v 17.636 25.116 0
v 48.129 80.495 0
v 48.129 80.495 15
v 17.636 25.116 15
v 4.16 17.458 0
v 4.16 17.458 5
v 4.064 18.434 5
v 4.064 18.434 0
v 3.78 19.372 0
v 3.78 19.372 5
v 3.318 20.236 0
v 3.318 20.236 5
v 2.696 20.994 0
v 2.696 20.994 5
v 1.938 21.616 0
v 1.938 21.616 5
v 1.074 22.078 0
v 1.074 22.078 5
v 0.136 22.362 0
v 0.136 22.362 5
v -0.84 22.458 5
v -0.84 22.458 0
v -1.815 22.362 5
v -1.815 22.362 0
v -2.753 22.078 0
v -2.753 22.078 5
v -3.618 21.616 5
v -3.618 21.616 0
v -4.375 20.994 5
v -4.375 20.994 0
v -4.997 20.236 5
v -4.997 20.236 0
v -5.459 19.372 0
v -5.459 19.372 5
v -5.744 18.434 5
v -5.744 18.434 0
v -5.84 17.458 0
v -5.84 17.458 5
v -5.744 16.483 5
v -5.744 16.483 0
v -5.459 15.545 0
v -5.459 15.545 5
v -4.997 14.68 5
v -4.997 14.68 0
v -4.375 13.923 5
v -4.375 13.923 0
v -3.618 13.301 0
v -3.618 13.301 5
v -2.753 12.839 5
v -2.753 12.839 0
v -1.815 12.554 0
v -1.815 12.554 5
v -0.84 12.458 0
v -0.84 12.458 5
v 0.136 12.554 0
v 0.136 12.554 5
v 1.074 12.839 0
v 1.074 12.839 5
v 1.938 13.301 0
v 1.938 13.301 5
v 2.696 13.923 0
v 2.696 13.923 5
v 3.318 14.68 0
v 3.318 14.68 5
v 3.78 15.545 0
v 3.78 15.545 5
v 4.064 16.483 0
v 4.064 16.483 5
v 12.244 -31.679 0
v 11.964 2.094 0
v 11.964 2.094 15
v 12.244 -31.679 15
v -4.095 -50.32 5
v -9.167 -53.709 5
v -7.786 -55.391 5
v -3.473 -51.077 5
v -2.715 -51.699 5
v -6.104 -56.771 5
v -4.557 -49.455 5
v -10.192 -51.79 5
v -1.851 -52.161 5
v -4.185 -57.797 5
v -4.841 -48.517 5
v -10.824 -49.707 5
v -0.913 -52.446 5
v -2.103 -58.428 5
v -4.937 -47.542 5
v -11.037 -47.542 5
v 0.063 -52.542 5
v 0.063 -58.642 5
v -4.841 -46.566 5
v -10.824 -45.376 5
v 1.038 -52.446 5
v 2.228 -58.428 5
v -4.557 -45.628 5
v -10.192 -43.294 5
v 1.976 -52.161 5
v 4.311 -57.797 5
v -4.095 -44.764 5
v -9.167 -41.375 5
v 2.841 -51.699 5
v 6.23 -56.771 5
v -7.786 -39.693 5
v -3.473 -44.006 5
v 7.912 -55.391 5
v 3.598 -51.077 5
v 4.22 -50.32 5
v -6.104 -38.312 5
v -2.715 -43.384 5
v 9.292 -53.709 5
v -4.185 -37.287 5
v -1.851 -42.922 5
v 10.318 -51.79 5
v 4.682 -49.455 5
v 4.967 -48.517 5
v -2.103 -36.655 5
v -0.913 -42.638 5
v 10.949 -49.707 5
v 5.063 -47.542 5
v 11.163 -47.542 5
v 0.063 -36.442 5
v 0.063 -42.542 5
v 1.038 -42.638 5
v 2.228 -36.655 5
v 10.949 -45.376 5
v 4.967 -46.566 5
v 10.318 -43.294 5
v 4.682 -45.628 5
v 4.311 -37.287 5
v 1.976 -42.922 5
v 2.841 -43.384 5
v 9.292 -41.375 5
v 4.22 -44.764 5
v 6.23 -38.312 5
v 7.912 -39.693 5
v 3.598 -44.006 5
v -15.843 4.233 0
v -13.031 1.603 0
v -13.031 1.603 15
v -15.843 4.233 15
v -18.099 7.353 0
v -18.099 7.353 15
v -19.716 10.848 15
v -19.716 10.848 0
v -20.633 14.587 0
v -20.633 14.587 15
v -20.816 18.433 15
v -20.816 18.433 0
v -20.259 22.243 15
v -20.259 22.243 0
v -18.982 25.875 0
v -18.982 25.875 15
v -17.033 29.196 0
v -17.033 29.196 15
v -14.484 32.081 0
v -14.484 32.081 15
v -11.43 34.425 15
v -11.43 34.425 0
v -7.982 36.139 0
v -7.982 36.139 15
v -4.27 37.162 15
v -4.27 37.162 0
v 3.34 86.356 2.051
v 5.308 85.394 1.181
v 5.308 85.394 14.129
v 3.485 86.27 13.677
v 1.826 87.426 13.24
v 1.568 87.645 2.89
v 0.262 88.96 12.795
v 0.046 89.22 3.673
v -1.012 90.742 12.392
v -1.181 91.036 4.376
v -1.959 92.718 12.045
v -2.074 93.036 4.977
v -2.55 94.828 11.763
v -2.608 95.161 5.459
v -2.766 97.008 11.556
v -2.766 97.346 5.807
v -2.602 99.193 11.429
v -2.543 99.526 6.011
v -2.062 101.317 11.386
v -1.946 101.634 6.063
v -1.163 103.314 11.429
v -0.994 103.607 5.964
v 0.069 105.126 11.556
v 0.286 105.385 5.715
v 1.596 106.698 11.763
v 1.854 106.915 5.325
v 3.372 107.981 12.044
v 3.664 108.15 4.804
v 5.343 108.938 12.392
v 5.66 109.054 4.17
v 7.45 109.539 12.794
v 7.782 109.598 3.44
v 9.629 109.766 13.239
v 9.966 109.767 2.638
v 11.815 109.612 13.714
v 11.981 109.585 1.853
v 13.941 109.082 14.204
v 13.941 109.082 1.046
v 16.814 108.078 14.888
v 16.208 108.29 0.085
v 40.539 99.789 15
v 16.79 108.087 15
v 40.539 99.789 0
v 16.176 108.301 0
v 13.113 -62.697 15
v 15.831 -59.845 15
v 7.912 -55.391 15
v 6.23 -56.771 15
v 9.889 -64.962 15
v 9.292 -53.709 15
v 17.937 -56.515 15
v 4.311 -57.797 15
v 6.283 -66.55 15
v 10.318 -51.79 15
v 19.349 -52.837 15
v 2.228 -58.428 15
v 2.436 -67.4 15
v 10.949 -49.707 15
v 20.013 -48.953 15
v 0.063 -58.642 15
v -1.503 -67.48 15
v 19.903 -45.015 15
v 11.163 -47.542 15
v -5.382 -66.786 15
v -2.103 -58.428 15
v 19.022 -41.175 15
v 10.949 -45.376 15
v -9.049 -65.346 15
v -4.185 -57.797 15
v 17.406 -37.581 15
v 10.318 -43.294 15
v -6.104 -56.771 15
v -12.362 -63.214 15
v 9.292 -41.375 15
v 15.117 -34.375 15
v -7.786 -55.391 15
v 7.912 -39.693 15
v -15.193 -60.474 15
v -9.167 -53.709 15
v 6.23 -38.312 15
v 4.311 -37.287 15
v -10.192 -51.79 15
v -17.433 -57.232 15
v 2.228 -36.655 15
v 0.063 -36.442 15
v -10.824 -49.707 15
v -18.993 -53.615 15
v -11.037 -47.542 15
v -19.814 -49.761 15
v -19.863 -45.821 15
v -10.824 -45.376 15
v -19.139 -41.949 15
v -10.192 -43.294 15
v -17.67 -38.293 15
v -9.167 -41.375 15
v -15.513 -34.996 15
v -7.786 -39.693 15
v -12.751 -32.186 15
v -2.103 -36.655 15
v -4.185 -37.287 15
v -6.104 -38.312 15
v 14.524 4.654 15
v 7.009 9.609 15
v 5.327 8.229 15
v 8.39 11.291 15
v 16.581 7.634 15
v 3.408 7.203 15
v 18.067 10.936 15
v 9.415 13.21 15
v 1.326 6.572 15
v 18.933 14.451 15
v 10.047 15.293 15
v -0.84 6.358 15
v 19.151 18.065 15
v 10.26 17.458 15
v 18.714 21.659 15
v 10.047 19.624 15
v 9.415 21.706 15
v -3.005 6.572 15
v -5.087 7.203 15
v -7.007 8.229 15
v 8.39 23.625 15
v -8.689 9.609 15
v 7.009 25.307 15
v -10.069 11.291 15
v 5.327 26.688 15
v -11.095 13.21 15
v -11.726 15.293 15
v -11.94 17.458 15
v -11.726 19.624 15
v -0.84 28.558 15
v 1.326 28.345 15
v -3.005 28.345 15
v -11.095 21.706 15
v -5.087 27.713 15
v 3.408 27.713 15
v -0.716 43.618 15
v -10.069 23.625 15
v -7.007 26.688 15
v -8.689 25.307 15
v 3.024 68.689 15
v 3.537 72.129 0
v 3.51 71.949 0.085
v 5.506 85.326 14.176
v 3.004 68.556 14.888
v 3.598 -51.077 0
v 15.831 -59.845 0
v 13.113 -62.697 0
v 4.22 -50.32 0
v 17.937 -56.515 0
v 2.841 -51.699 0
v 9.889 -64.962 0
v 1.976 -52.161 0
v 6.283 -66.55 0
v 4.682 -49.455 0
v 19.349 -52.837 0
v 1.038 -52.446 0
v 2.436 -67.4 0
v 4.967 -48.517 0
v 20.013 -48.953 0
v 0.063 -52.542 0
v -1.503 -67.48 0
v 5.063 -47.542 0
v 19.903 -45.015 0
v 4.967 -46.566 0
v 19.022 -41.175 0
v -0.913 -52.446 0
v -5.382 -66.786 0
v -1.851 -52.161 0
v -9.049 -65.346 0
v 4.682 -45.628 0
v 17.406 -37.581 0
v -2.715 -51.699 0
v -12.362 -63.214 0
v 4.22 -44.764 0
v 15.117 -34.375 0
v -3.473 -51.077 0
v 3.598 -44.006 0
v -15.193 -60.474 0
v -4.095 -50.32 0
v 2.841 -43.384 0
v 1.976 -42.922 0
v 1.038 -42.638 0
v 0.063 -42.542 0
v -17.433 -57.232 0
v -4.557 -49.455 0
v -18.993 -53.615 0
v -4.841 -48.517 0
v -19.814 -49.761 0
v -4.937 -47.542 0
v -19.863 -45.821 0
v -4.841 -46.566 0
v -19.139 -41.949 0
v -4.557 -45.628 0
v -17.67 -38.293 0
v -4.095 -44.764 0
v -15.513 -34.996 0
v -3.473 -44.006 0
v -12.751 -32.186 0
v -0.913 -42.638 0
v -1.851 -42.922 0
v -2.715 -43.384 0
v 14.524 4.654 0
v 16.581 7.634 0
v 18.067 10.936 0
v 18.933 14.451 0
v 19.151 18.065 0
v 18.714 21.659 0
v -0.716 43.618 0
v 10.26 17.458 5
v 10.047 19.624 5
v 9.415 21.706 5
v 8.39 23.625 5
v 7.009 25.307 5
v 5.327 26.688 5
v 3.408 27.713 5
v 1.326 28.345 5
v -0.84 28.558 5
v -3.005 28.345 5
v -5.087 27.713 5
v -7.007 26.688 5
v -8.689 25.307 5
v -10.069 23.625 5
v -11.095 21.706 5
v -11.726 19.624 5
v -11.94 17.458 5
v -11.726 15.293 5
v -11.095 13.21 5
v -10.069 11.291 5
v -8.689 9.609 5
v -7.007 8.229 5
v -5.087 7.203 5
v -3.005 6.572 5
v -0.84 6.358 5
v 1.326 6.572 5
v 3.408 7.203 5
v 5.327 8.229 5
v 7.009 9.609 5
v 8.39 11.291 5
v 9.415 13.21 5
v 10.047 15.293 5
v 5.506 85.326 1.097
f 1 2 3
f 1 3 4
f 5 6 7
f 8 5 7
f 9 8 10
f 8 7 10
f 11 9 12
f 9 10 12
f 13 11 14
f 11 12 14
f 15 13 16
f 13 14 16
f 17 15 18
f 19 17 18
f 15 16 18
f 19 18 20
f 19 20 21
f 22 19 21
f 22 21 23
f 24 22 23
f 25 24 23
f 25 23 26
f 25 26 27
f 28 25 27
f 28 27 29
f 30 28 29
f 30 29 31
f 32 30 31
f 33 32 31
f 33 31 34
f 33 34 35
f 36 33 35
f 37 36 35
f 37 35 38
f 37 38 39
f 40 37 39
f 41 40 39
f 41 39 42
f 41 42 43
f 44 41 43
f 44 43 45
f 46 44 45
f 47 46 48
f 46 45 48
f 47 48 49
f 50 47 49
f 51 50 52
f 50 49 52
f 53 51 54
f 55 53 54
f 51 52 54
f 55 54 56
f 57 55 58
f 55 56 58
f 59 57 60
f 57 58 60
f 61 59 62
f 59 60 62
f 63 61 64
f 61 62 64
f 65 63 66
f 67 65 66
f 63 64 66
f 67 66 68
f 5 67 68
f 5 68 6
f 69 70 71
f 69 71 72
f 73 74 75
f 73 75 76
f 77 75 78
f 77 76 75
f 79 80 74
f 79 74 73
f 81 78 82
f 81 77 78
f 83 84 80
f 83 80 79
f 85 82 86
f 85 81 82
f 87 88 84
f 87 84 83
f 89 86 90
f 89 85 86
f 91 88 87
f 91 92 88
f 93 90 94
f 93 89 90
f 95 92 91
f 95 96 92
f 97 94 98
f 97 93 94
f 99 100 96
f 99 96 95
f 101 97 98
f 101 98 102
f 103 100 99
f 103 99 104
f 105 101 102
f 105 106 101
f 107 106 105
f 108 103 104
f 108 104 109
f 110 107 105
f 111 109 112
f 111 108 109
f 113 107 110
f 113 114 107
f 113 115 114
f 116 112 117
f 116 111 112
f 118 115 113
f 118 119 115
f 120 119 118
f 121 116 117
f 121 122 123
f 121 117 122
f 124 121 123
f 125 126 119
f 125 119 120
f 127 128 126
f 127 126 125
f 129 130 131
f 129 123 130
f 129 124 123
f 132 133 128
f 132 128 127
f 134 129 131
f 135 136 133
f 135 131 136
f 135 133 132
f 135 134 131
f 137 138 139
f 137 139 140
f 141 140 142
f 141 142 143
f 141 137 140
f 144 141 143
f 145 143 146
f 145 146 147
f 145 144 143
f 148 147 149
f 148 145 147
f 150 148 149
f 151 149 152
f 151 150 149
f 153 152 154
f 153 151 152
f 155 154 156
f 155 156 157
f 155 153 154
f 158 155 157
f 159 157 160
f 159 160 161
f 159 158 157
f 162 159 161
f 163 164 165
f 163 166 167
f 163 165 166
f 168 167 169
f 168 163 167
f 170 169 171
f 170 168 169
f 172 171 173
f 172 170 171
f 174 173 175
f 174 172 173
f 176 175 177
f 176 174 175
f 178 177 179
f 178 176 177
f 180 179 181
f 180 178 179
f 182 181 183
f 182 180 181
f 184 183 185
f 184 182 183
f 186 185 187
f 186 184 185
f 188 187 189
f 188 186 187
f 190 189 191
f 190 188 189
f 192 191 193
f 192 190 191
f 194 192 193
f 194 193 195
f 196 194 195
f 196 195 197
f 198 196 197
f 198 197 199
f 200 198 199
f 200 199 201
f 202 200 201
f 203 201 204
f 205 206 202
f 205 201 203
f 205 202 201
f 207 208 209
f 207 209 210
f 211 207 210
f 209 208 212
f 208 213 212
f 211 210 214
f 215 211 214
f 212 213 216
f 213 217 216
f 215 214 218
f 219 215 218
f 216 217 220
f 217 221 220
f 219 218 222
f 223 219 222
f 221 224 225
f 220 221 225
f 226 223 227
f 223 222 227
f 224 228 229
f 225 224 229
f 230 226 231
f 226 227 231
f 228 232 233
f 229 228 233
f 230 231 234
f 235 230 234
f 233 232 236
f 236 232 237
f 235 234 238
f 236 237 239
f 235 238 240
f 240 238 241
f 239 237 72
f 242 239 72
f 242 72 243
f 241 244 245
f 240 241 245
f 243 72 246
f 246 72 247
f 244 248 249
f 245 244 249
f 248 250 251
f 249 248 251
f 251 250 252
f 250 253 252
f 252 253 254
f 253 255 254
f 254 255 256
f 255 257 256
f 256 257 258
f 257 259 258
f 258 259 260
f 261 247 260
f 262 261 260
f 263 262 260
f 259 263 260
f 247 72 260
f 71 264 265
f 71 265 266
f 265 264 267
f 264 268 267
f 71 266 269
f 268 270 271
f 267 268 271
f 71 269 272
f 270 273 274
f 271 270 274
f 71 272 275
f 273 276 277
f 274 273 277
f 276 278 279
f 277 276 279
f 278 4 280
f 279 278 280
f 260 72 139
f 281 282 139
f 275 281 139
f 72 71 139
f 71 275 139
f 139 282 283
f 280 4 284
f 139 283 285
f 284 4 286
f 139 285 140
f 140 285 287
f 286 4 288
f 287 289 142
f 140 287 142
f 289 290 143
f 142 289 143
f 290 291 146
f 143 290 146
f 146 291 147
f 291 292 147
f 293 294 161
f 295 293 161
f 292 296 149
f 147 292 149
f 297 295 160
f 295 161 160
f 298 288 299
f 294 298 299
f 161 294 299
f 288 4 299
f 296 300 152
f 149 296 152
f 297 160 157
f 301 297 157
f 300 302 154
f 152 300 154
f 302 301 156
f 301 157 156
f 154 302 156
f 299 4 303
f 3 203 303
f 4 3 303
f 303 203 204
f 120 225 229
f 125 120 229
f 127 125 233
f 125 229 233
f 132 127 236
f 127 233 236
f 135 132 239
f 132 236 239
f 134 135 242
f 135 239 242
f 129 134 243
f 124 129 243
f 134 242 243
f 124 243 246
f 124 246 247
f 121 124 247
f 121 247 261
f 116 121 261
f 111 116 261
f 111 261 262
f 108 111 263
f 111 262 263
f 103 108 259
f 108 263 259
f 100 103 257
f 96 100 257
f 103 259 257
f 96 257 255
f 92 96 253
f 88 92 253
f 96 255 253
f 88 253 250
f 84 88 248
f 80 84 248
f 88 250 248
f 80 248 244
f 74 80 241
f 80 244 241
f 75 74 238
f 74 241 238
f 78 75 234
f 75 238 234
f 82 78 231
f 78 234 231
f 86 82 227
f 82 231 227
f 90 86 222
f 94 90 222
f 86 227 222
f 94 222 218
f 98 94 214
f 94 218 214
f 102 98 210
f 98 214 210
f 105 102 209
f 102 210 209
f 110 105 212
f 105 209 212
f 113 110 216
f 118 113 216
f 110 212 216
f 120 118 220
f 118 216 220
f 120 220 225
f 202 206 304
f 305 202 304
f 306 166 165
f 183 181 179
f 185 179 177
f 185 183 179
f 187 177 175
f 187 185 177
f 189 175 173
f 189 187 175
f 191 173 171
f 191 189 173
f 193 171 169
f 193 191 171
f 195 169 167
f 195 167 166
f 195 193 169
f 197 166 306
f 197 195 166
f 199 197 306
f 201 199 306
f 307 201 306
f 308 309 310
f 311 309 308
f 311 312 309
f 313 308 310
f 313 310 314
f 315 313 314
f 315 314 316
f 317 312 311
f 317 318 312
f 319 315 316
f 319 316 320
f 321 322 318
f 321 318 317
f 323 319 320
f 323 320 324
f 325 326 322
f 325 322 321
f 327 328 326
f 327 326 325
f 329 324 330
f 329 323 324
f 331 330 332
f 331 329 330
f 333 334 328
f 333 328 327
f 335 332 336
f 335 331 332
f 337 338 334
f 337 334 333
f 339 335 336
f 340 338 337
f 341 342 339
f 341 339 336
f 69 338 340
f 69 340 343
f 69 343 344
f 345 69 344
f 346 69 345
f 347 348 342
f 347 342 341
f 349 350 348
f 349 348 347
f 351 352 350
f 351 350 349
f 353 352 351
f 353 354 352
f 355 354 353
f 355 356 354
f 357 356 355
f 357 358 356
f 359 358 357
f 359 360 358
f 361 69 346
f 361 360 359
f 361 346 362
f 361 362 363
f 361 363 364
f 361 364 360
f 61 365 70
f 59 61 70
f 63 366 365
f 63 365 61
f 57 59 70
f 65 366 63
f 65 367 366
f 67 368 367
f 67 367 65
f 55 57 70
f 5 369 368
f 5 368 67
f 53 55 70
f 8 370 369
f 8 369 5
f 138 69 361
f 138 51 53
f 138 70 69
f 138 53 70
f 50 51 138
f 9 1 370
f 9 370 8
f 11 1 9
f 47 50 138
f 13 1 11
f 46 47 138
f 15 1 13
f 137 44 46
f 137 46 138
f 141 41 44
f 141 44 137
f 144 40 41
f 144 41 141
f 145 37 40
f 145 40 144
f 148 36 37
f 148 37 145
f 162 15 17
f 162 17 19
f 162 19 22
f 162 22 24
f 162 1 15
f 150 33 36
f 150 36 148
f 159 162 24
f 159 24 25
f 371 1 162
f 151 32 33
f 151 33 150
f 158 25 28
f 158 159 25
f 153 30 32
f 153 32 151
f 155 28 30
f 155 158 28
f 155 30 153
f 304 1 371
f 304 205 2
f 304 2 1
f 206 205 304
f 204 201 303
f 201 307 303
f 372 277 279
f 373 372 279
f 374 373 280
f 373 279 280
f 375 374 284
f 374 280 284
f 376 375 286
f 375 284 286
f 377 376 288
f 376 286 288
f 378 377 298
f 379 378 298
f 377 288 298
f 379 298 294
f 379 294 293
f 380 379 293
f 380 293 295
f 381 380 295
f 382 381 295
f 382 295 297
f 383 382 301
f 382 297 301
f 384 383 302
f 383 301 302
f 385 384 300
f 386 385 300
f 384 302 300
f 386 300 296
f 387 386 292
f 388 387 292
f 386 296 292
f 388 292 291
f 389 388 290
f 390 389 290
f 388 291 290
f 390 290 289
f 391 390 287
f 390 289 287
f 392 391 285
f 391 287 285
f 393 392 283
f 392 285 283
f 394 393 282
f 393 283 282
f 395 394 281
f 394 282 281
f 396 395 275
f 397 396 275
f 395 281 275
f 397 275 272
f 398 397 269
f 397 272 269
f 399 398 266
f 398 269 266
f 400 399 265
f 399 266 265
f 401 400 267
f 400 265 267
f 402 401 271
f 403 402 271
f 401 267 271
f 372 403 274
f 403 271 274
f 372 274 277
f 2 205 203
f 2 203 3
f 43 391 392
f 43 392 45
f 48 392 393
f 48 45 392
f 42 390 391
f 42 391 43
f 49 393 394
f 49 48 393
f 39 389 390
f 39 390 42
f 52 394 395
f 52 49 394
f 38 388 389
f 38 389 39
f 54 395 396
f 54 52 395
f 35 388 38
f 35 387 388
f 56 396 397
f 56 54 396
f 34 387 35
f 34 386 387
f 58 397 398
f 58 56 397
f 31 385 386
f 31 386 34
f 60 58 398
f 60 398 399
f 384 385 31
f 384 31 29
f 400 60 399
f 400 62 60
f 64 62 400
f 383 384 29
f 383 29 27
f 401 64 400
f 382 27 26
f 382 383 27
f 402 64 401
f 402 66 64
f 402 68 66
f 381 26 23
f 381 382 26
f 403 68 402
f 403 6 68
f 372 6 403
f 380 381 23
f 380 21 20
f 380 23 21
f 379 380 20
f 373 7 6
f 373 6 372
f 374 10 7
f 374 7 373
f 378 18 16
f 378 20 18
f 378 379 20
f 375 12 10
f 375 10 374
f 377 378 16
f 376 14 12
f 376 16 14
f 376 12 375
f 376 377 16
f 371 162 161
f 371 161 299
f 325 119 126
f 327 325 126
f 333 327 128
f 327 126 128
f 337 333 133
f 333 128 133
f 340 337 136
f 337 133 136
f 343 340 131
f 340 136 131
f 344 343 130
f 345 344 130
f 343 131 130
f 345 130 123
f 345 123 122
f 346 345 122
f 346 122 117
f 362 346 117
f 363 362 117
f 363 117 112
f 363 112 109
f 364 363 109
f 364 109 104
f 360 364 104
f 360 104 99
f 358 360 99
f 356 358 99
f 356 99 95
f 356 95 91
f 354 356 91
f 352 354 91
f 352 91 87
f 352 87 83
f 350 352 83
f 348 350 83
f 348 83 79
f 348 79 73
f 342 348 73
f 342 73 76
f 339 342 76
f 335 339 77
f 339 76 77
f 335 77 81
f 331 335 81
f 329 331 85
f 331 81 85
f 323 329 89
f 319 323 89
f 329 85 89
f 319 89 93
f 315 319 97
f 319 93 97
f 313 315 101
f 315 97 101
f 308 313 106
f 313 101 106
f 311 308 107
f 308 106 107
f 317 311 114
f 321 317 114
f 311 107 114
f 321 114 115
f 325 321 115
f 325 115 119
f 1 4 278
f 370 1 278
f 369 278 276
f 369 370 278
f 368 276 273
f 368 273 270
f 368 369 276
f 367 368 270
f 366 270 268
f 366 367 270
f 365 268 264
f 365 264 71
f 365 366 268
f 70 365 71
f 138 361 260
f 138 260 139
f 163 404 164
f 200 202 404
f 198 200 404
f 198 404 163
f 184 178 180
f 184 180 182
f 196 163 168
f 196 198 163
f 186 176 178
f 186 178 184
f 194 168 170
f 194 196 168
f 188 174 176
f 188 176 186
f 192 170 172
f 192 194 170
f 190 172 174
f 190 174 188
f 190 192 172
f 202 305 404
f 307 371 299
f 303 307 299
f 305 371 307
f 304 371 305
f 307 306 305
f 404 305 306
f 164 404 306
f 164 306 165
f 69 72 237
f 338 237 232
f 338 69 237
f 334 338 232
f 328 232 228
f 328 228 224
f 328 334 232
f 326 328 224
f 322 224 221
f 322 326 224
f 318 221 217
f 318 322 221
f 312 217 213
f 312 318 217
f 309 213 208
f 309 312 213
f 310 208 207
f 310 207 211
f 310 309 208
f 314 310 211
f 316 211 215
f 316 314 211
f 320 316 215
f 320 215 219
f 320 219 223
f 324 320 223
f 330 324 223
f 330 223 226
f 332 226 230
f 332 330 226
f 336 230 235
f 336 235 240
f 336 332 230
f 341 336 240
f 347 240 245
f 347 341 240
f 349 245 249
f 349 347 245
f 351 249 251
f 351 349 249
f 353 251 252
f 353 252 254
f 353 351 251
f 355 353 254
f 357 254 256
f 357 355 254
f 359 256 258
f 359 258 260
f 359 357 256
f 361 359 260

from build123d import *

# Parameters (mm, degrees)
BOSS_EXTRUDE1_DEPTH     = 15
SKETCH2_R               = 11.1
CUT_EXTRUDE1_DEPTH      = 10
SKETCH3_R               = 5
CUT_EXTRUDE2_DEPTH      = 10
CUT_EXTRUDE_THIN3_DEPTH = 63


with BuildPart() as part:
    # Sketch1 → Boss-Extrude1 (new body)
    with BuildSketch(Plane.XY):
        with BuildLine():
            Line((5.505816945, 85.326012217), (5.307768654, 85.393580353))
            ThreePointArc((5.307768654, 85.393580353), (-2.005055015, 101.475976607), (13.940536847, 109.082484312))
            Line((13.940536847, 109.082484312), (40.538740524, 99.7887516))
            Line((40.538740524, 99.7887516), (48.129208704, 80.495248668))
            Line((48.129208704, 80.495248668), (17.636215156, 25.115965593))
            ThreePointArc((17.636215156, 25.115965593), (18.579608232, 12.6739017), (11.964278199, 2.09409296))
            Line((11.964278199, 2.09409296), (12.243619866, -31.678974911))
            ThreePointArc((12.243619866, -31.678974911), (0.468324559, -67.537617109), (-12.751239862, -32.185913949))
            Line((-12.751239862, -32.185913949), (-13.03091257, 1.603476045))
            ThreePointArc((-13.03091257, 1.603476045), (-20.259022529, 22.242640416), (-4.270337109, 37.161843413))
            Line((-4.270337109, 37.161843413), (-0.71558036, 43.617748767))
            Line((-0.71558036, 43.617748767), (5.505816945, 85.326012217))
        make_face()
    extrude(amount=BOSS_EXTRUDE1_DEPTH)

    # Sketch2 → Cut-Extrude1 (cut)
    with BuildSketch(Plane.XY.offset(15)):
        with Locations((-0.839707244, 17.458270673)):
            Circle(SKETCH2_R)
        with Locations((0.062773329, -47.541729327)):
            Circle(SKETCH2_R)
    extrude(amount=-CUT_EXTRUDE1_DEPTH, mode=Mode.SUBTRACT)

    # Sketch3 → Cut-Extrude2 (cut)
    with BuildSketch(Plane.XY.offset(5)):
        with Locations((-0.839707244, 17.458270673)):
            Circle(SKETCH3_R)
        with Locations((0.062773329, -47.541729327)):
            Circle(SKETCH3_R)
    extrude(amount=-CUT_EXTRUDE2_DEPTH, mode=Mode.SUBTRACT)

    # Sketch6 → Cut-Extrude-Thin3 (cut)
    with BuildSketch(Plane(origin=(35.484462303, 101.554777284, 0), x_dir=(0.944031293, -0.329855904, 0), z_dir=(0.329855904, 0.944031293, 0))):
        Polygon((-20.418832703, -0.085187968), (-37.64557492, -6.976961591), (-41.359981954, 2.307605194), (-24.133239737, 9.199378817), align=None)
        Polygon((-37.640333131, -10.87506916), (-19.777391753, -14.888150458), (-21.969352424, -24.644958769), (-39.832293801, -20.631877471), align=None)
    extrude(amount=-CUT_EXTRUDE_THIN3_DEPTH, mode=Mode.SUBTRACT)


solid = part.part
